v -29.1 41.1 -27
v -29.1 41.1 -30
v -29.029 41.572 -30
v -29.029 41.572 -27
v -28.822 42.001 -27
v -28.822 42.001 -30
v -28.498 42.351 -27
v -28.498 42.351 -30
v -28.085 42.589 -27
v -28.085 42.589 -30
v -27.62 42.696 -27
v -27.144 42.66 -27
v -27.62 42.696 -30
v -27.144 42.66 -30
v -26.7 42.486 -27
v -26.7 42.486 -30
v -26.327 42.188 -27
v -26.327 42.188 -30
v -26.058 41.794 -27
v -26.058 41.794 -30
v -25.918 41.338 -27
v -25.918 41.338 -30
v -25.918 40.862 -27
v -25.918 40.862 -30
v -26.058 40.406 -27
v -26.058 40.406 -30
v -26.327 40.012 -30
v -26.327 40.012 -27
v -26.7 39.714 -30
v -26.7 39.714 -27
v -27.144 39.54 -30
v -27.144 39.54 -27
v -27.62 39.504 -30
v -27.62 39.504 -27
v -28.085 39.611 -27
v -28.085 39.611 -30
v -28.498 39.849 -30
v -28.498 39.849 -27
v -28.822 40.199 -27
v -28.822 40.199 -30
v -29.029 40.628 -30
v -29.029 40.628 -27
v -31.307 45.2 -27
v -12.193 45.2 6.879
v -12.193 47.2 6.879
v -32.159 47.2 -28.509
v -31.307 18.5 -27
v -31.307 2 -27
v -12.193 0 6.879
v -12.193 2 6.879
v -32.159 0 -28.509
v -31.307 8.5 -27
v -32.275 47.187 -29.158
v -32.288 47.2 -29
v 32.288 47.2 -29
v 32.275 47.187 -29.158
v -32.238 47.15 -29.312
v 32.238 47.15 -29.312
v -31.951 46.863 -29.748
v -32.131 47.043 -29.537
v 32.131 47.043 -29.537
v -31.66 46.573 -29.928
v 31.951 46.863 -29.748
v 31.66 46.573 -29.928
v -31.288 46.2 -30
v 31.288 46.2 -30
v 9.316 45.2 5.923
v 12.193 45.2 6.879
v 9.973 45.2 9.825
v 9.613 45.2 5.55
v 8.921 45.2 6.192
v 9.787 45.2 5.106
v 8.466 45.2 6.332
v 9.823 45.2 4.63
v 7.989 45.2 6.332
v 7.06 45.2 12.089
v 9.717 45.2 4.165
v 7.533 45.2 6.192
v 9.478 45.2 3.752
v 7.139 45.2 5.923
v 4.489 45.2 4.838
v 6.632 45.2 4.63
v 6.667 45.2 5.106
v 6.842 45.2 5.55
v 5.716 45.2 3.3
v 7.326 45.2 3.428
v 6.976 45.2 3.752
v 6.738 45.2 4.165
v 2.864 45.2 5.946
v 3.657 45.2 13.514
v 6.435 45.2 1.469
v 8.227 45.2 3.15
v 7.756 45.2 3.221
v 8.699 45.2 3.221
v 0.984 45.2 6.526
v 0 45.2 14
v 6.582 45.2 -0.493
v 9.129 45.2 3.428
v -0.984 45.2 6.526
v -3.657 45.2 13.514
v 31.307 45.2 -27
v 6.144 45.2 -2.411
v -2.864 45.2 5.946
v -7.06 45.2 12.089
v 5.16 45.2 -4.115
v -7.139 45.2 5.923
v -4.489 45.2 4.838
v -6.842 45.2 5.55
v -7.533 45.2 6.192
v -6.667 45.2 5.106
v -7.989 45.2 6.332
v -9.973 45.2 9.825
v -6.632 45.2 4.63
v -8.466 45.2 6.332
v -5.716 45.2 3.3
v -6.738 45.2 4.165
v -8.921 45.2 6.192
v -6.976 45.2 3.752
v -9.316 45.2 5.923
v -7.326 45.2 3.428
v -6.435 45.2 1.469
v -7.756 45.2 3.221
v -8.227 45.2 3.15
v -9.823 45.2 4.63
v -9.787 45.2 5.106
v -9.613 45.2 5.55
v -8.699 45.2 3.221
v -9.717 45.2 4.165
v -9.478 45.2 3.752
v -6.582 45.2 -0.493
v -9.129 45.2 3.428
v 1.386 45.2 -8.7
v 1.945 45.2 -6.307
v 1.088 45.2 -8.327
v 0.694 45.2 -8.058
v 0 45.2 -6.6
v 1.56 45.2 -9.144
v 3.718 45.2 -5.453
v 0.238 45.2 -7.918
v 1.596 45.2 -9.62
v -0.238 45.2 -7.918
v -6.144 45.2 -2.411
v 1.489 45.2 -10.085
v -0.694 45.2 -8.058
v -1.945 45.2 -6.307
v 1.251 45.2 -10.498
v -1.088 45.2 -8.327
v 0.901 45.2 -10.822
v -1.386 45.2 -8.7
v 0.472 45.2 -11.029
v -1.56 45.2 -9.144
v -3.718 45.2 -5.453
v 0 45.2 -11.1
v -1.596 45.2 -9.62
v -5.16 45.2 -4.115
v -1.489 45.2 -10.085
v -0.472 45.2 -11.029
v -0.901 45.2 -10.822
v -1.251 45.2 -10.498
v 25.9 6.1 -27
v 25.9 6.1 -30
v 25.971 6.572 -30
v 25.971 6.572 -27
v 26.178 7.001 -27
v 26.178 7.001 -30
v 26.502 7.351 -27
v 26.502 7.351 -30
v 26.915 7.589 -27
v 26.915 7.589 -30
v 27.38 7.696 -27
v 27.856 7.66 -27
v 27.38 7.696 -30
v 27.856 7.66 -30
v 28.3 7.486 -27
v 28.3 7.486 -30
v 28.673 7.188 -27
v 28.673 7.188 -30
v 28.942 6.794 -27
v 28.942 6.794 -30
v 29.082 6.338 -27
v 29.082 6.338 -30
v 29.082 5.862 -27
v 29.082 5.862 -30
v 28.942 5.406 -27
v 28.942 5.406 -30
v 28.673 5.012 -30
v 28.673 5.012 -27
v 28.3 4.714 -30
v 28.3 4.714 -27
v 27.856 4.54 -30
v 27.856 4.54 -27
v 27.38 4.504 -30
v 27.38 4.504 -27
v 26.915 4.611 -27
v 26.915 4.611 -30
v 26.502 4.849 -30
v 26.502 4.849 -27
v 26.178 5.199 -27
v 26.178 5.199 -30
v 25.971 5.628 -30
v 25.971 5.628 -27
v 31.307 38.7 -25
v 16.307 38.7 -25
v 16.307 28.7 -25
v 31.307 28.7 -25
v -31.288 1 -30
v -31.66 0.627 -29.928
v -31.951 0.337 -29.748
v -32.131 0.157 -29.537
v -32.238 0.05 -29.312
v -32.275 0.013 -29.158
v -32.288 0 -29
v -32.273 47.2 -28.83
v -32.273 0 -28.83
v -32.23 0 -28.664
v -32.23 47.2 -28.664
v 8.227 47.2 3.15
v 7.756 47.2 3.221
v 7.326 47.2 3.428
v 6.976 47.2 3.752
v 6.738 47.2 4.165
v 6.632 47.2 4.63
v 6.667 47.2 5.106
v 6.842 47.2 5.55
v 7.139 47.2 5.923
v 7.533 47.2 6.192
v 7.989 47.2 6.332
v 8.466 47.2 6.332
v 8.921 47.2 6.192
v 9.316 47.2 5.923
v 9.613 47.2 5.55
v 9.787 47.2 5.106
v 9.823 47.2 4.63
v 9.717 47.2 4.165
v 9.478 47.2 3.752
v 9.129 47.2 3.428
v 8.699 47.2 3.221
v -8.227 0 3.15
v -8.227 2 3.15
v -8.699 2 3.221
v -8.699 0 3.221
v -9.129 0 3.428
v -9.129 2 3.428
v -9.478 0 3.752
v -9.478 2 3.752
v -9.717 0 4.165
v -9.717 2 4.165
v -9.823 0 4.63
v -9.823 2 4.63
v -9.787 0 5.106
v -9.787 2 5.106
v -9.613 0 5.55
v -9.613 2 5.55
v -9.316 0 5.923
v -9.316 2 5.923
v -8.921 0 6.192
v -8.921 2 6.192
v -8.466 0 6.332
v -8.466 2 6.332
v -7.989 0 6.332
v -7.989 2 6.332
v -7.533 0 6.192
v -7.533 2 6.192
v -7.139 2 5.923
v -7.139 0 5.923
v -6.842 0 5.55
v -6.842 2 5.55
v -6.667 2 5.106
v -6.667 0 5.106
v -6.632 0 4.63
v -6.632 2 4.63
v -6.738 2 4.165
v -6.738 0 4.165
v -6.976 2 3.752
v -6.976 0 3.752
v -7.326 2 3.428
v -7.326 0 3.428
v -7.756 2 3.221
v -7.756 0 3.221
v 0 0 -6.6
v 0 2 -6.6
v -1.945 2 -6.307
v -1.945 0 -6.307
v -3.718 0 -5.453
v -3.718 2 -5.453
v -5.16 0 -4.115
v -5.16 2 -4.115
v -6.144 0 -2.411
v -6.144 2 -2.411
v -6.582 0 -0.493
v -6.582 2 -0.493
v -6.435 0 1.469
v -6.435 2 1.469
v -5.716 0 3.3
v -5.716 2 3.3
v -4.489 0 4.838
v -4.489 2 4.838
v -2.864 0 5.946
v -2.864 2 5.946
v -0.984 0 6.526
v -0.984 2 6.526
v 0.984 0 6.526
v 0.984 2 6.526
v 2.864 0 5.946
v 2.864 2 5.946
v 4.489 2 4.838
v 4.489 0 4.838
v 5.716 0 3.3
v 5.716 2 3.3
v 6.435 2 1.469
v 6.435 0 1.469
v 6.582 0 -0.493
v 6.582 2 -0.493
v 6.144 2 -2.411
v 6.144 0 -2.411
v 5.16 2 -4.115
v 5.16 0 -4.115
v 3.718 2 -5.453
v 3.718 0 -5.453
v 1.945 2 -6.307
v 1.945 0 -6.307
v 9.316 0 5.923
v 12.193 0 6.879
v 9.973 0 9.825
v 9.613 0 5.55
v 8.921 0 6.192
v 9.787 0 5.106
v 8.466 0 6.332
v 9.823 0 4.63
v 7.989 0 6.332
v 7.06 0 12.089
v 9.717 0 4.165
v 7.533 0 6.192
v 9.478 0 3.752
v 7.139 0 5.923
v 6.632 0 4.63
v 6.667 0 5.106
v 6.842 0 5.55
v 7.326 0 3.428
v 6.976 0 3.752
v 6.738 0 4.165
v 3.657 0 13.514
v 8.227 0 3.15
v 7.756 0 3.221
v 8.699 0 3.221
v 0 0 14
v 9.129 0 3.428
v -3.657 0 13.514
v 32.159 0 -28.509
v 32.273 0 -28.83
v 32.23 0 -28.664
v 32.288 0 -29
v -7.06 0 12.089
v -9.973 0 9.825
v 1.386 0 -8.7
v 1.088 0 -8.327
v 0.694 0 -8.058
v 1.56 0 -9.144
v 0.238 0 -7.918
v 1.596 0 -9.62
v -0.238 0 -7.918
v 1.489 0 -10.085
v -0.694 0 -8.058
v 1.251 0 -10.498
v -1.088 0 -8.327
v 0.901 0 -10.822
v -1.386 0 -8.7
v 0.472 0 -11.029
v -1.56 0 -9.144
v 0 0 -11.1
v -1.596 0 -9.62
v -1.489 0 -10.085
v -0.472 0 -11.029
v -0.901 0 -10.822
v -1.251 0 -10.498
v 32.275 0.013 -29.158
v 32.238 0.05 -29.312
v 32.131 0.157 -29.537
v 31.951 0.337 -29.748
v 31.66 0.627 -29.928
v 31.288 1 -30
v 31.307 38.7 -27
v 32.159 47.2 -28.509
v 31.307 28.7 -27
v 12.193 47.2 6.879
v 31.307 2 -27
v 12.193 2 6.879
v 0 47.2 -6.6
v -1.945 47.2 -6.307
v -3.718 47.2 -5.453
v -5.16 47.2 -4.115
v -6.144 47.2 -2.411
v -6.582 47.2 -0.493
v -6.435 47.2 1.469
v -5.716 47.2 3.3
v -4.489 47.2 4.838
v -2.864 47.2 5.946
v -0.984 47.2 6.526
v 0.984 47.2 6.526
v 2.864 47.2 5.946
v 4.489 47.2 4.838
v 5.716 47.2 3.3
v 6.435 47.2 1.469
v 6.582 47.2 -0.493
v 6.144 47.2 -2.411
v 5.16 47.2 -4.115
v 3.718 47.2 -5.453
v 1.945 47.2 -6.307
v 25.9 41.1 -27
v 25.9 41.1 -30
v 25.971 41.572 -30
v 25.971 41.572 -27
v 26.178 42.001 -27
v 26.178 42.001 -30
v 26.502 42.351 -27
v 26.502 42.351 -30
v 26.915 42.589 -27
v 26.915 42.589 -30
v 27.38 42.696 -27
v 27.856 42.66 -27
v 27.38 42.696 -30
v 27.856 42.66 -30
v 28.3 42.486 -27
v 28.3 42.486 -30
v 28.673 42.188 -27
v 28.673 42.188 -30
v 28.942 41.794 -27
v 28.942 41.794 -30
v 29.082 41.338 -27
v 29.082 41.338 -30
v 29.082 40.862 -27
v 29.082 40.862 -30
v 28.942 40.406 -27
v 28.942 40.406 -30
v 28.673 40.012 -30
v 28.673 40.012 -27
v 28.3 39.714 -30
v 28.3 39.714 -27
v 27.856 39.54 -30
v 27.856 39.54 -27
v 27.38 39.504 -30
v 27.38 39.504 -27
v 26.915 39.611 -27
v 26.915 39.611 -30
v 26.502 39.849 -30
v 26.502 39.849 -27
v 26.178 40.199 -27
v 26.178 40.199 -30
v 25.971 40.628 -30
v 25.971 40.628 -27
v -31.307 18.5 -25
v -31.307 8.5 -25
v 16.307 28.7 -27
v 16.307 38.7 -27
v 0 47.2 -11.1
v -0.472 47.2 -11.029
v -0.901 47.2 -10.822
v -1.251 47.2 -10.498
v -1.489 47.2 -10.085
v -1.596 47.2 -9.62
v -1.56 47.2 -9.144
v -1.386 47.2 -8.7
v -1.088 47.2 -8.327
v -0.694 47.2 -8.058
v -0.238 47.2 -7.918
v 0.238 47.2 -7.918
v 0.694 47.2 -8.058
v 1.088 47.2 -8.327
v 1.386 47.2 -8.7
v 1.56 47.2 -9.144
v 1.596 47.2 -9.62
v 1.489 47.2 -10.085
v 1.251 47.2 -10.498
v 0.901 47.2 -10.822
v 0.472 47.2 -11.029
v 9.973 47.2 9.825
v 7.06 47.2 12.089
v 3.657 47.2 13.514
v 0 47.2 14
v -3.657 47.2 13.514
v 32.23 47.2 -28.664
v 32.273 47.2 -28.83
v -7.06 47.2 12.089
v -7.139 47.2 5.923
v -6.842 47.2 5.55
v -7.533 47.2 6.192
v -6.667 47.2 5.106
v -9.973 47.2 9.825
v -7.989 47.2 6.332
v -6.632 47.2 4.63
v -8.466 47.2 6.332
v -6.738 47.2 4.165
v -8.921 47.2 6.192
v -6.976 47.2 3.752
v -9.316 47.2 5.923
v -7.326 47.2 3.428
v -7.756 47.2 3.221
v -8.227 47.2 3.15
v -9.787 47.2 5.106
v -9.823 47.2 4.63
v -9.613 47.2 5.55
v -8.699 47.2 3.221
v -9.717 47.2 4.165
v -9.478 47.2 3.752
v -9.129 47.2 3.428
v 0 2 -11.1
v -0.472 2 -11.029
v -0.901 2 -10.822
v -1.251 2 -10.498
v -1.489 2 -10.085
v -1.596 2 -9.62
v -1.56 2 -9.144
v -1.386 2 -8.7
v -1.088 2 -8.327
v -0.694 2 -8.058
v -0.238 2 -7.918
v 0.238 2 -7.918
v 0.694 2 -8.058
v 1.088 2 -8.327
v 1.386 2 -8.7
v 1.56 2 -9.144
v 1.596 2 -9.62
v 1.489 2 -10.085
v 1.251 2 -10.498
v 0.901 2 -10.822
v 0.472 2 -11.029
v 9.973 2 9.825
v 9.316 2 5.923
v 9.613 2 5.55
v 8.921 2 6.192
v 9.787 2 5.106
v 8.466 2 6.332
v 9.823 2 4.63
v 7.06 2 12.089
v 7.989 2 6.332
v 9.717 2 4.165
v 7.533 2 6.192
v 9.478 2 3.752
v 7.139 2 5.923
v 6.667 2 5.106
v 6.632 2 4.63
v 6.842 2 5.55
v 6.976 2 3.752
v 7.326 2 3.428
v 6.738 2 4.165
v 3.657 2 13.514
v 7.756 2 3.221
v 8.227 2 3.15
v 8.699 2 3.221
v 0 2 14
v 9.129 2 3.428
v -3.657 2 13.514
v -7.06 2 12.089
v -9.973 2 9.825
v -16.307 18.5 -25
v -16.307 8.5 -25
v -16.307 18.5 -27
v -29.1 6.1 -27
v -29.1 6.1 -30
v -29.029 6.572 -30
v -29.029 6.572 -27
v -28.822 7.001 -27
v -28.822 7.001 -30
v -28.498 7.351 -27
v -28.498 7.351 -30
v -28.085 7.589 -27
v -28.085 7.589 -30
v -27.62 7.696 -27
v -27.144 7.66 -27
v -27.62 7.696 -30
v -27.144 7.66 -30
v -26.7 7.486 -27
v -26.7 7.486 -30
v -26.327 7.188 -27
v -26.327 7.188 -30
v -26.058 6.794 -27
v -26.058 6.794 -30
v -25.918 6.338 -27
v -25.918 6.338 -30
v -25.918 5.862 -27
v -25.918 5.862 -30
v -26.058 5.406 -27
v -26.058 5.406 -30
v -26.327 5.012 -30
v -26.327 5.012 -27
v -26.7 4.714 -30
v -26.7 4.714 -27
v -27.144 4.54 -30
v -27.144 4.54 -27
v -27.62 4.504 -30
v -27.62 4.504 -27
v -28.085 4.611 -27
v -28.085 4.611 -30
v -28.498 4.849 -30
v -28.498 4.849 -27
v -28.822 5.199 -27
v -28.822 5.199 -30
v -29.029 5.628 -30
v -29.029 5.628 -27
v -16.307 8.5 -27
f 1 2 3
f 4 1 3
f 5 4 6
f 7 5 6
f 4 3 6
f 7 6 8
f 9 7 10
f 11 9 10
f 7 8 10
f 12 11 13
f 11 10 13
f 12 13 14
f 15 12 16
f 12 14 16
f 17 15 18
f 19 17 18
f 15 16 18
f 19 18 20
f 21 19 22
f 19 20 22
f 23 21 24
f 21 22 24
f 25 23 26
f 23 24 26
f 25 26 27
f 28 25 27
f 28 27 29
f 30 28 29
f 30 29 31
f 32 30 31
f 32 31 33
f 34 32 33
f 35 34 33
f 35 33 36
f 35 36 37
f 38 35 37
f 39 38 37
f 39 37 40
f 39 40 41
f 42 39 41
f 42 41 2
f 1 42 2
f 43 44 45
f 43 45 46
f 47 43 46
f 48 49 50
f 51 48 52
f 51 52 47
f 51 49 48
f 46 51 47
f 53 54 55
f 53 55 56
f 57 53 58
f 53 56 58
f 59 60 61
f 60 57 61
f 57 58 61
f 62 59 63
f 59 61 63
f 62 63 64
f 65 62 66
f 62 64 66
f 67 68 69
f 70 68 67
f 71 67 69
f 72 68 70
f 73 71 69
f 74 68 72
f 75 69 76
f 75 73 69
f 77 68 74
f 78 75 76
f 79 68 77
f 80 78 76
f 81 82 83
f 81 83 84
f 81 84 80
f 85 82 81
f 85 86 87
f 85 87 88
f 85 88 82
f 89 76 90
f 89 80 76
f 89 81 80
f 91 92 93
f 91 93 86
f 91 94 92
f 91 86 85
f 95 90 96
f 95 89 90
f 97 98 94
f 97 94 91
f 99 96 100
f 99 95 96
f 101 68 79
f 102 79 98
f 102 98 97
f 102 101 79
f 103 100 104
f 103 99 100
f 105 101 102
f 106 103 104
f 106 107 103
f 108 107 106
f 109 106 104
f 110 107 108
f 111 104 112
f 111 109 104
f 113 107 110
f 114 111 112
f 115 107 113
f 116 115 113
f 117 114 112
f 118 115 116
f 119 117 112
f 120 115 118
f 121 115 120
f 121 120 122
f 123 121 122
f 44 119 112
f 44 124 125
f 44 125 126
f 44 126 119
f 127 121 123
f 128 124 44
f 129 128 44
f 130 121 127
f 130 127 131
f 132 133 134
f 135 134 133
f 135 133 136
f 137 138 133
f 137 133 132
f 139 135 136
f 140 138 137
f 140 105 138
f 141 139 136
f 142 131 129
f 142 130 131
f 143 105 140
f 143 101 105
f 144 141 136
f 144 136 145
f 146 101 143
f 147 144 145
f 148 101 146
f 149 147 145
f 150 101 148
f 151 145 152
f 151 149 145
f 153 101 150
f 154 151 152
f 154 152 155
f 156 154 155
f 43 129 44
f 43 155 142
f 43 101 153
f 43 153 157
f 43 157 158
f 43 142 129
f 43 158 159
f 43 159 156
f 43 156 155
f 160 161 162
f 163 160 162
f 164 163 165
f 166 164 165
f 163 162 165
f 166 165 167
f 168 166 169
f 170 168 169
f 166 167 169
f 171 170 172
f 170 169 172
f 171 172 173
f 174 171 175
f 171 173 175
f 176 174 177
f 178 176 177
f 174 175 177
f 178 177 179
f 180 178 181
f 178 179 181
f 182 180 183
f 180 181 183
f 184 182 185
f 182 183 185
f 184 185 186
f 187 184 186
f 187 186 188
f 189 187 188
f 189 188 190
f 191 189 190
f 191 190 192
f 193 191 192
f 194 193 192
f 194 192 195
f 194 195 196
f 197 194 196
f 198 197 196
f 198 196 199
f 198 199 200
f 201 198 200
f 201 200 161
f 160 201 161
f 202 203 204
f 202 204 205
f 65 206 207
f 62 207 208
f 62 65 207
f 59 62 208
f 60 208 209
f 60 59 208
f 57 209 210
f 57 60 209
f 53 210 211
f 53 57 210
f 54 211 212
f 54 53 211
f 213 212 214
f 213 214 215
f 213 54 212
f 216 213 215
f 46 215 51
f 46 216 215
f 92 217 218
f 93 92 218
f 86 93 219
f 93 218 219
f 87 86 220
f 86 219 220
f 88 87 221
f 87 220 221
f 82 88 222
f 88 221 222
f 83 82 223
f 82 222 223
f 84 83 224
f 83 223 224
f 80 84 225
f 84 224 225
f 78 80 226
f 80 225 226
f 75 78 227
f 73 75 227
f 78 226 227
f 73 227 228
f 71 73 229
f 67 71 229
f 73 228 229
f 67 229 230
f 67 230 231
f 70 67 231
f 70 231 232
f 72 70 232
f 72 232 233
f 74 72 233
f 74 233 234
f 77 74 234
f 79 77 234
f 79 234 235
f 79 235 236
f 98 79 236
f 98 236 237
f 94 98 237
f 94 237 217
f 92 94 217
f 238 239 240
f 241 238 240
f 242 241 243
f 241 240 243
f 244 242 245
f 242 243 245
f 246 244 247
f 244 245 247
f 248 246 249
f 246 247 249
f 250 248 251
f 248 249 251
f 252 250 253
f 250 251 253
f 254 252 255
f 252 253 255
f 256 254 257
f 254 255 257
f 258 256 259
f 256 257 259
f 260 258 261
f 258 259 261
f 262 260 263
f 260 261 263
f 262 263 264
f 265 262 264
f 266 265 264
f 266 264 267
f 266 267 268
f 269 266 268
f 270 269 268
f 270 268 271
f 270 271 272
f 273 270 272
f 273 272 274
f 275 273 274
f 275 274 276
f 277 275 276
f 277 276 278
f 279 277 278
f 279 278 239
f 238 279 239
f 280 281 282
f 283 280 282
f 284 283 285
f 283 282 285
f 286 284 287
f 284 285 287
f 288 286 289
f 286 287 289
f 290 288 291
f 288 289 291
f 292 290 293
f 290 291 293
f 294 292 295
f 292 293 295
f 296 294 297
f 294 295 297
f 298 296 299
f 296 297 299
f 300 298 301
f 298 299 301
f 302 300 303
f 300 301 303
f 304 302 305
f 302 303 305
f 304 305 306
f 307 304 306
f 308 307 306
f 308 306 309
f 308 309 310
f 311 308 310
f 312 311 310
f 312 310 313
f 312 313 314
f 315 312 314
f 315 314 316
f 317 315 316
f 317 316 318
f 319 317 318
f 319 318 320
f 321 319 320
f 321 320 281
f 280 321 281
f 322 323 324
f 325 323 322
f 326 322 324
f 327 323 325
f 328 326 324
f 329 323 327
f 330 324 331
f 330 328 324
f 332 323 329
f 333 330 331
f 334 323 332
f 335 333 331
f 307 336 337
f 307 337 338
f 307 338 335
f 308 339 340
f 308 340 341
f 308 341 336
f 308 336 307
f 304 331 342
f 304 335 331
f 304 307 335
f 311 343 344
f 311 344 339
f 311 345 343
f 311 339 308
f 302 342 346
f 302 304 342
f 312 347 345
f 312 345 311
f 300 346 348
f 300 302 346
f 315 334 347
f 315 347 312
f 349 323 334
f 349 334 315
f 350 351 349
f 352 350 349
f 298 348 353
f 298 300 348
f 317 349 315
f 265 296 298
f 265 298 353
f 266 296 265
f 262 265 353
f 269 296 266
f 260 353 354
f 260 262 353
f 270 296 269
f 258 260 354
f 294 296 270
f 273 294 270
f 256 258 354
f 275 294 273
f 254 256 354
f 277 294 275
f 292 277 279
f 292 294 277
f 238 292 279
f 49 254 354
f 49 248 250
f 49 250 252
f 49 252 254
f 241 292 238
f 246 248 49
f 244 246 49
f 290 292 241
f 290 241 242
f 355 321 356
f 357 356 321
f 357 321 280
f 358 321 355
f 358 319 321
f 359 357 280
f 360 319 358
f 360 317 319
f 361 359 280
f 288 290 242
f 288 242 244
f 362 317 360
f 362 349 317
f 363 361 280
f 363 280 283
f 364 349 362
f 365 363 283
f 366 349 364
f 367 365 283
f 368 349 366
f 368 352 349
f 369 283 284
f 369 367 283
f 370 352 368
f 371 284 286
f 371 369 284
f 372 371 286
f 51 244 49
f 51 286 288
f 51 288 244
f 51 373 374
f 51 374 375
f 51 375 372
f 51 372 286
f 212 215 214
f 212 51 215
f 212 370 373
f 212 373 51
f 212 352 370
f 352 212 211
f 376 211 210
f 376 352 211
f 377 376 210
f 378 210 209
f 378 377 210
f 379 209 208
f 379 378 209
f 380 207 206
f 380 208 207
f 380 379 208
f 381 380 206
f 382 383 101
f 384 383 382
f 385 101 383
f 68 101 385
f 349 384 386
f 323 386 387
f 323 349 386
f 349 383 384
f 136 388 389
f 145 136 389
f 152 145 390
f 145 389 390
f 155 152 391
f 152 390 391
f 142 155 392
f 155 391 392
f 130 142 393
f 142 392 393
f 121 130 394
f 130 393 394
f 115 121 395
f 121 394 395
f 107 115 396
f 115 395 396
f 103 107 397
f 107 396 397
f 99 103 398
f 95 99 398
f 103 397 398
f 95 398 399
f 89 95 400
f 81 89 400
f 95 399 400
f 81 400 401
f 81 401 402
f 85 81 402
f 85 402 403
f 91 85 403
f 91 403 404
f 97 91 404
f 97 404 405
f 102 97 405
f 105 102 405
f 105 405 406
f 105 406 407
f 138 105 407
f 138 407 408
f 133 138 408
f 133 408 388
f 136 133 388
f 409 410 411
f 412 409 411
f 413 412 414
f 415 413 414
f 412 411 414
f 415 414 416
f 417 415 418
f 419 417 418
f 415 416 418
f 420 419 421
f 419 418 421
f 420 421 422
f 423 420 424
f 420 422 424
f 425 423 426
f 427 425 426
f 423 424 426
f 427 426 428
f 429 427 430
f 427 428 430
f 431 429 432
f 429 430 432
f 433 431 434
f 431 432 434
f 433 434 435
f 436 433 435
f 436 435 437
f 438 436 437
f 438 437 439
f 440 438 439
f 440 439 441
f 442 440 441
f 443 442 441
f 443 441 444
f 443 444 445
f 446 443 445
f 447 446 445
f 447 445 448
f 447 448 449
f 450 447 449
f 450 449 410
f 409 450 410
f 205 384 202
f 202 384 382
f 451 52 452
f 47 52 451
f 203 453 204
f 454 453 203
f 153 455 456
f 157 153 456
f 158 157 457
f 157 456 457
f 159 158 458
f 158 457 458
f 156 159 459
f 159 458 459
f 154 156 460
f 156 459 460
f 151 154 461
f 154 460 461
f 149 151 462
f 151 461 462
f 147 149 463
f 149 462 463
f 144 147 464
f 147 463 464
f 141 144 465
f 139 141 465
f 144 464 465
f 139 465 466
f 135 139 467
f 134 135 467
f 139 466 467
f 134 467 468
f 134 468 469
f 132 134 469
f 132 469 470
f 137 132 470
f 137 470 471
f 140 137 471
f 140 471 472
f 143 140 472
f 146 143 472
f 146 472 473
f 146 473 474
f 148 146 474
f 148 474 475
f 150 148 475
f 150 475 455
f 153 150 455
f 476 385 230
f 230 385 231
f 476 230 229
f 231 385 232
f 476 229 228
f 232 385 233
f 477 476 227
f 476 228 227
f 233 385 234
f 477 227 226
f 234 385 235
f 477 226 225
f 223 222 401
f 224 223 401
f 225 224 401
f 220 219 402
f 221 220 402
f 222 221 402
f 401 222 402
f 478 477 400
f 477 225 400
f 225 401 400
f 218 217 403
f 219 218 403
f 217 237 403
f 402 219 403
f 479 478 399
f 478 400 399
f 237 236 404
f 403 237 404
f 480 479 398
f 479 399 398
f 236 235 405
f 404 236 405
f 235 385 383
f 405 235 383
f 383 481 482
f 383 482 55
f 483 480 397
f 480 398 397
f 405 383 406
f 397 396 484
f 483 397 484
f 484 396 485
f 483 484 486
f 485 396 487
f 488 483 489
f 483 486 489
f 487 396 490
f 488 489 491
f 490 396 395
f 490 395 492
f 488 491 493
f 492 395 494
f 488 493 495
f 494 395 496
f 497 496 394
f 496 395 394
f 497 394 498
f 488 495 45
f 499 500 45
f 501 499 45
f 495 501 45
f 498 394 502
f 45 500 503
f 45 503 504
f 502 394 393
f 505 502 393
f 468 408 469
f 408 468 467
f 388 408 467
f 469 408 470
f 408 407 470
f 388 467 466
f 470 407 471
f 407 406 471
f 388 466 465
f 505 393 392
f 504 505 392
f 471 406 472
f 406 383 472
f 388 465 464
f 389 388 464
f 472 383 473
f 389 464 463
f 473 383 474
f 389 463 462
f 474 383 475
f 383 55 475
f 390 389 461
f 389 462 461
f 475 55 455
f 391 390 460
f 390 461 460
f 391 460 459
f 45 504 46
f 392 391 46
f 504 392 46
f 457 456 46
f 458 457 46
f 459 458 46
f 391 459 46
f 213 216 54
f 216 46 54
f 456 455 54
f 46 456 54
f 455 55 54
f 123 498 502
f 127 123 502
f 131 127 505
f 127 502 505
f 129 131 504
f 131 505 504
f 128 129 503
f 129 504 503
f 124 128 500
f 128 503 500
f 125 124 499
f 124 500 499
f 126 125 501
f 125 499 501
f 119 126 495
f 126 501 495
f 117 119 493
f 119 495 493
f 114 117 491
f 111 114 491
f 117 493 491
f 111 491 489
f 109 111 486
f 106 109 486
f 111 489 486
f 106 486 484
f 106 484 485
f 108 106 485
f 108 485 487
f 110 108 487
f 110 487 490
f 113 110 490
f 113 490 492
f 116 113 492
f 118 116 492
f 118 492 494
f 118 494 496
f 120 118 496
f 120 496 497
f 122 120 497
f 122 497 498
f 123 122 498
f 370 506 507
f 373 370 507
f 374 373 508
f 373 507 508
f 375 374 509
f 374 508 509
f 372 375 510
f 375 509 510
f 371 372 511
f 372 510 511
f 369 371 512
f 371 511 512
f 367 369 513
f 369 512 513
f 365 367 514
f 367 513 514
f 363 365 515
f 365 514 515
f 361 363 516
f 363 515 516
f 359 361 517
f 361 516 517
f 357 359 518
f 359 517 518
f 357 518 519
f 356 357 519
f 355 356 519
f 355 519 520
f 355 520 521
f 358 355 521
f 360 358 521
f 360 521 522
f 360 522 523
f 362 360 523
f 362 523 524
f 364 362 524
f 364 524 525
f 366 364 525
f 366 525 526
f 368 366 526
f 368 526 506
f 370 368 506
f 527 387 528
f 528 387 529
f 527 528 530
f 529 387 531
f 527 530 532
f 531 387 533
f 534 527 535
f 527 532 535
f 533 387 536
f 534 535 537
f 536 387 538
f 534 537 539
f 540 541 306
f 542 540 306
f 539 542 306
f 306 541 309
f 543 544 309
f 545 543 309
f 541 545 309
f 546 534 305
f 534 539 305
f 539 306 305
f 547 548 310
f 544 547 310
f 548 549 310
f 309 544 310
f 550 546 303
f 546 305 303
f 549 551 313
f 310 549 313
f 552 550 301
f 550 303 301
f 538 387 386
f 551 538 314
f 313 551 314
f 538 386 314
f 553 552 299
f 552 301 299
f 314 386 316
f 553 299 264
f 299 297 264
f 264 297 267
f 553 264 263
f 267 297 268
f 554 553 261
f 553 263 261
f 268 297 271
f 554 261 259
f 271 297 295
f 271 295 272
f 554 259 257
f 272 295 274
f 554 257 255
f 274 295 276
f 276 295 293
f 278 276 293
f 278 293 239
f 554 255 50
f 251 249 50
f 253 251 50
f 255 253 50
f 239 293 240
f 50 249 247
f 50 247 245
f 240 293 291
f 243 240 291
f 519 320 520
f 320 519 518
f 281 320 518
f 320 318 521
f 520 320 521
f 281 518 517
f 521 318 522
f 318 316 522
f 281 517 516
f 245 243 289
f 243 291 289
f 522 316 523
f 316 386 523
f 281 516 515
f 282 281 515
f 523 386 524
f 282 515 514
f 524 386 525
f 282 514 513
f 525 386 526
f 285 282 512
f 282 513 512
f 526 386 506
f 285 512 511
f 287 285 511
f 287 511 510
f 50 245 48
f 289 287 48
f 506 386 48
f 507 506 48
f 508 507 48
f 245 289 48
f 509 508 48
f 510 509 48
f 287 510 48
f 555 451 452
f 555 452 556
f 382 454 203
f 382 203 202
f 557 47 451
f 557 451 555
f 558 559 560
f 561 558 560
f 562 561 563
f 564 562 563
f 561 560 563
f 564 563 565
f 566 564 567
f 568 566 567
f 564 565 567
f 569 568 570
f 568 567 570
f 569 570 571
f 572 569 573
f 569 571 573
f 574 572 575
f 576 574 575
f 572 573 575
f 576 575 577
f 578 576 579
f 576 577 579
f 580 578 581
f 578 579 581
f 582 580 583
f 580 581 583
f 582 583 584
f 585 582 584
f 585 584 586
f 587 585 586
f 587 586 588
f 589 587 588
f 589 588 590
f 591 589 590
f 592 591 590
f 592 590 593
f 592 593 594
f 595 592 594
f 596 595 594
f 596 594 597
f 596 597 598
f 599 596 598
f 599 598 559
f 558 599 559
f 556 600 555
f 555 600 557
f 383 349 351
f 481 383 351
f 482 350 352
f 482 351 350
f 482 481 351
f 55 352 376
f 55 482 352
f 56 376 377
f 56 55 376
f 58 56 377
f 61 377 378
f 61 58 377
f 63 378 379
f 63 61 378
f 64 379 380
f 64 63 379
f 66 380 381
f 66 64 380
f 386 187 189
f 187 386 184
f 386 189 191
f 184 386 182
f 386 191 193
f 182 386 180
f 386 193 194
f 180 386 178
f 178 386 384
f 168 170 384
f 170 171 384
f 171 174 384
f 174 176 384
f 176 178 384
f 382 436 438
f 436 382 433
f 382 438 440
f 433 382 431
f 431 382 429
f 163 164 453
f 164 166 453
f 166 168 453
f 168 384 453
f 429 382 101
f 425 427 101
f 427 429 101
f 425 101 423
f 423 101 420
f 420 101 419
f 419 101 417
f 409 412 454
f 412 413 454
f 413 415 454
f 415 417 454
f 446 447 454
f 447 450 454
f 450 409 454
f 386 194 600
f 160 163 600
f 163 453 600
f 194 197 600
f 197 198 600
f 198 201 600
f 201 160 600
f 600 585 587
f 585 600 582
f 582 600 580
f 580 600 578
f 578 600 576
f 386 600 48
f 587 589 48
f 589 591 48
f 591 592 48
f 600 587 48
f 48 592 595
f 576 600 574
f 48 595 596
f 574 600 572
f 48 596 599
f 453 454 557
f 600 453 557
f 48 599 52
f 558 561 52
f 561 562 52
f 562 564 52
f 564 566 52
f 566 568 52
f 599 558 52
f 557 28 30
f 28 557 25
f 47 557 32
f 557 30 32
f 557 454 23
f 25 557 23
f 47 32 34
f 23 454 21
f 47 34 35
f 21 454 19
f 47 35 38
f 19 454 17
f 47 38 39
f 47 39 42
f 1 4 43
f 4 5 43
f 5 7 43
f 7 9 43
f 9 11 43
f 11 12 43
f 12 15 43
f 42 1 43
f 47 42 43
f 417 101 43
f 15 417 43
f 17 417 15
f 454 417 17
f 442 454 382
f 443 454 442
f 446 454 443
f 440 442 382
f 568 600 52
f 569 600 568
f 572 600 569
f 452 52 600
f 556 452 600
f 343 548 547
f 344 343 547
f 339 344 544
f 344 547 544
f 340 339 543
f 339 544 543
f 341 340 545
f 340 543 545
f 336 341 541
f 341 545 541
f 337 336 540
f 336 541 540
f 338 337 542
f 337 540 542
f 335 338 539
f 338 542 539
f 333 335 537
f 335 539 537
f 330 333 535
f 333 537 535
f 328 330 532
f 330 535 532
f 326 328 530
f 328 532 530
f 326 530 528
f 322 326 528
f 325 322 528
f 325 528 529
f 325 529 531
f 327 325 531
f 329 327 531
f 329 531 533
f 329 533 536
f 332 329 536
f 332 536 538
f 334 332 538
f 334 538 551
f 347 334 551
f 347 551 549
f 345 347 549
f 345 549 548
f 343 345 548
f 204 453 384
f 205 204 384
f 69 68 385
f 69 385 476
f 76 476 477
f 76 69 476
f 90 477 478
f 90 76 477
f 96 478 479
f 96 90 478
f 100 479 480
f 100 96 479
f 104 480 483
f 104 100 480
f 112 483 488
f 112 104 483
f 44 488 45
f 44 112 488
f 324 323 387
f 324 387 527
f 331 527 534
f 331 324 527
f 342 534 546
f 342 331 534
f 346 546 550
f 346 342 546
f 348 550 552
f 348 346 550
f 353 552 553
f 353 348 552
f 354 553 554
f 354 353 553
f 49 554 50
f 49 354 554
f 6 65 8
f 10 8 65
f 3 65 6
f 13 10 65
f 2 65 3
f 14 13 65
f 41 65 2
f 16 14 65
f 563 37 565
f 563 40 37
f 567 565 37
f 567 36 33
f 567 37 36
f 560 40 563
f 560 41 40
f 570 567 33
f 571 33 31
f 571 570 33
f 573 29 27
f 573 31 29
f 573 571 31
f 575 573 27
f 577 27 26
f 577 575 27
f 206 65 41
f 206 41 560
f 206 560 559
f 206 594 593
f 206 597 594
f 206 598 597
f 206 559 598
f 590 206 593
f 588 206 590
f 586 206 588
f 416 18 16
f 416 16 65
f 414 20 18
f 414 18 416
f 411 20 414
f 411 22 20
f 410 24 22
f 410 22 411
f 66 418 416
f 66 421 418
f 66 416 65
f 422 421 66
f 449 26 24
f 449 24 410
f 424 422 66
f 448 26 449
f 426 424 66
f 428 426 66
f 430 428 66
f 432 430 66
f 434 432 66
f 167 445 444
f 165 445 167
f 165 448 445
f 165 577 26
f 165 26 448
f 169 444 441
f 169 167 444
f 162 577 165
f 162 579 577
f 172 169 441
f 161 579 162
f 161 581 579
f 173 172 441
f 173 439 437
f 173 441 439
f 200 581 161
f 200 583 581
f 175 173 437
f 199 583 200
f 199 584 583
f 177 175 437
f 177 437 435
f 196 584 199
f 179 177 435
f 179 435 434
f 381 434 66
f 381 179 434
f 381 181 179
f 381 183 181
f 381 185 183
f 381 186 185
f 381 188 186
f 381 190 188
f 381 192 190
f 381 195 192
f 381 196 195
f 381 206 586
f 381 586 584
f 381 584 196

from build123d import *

# Parameters (mm, degrees)
EXTRUDE_1_DEPTH     = 47.2
CUT_EXTRUDE_2_REACH = 77.476
CUT_EXTRUDE_START   = -3
SKETCH_2_W          = 66
SKETCH_2_H          = 43.2
CUT_EXTRUDE_3_REACH = 66.937
SKETCH_3_R          = 1.6
SKETCH_3_R_2        = 6.6
CUT_EXTRUDE_4_REACH = 74.476
SKETCH_4_R          = 1.6
FILLET_1_R          = 1
SKETCH_5_W          = 15
SKETCH_5_H          = 10
EXTRUDE_2_DEPTH     = 2


with BuildPart() as part:
    # 草图1 → 凸台-拉伸1 (new body)
    with BuildSketch(Plane(origin=(0, 0, 0), x_dir=(1, 0, 0), z_dir=(0, 1, 0))):
        with BuildLine():
            Line((33, 30), (12.193267422, -6.879260831))
            ThreePointArc((12.193267422, -6.879260831), (0, -14), (-12.193267422, -6.879260831))
            Line((-12.193267422, -6.879260831), (-33, 30))
            Line((-33, 30), (33, 30))
        make_face()
    extrude(amount=EXTRUDE_1_DEPTH)

    # 草图2 → 切除-拉伸2 (cut, up to next)
    with BuildSketch(Plane(origin=(0, 0, -30), x_dir=(-1, 0, 0), z_dir=(0, 0, -1)).offset(CUT_EXTRUDE_START), mode=Mode.PRIVATE) as cut_extrude_2_sk1:
        with Locations((0, 23.6)):
            Rectangle(SKETCH_2_W, SKETCH_2_H)
    cut_extrude_2_tool1 = extrude(cut_extrude_2_sk1.sketch, amount=-CUT_EXTRUDE_2_REACH, mode=Mode.PRIVATE) & part.part
    add(cut_extrude_2_tool1.solids().sort_by_distance((0, 23.6, -27))[0], mode=Mode.SUBTRACT)

    # 切除-拉伸3: up to this face of the body (flat: up to its plane)
    cut_extrude_3_end = Plane(part.part.faces().sort_by_distance((0, 0, -12.723672626))[0])
    # 草图3 → 切除-拉伸3 (cut, up to the picked face)
    with BuildSketch(Plane(origin=(0, 47.2, 0), x_dir=(1, 0, 0), z_dir=(0, 1, 0)), mode=Mode.PRIVATE) as cut_extrude_3_sk1:
        with Locations(Location((-8.227241336, -4.75, 0), (0, 0, 90))):
            Circle(SKETCH_3_R)
    cut_extrude_3_tool1 = split(extrude(cut_extrude_3_sk1.sketch, amount=-CUT_EXTRUDE_3_REACH, mode=Mode.PRIVATE), bisect_by=cut_extrude_3_end, keep=Keep.BOTH, mode=Mode.PRIVATE)
    # 草图3 → 切除-拉伸3 (cut, up to the picked face)
    with BuildSketch(Plane(origin=(0, 47.2, 0), x_dir=(1, 0, 0), z_dir=(0, 1, 0)), mode=Mode.PRIVATE) as cut_extrude_3_sk2:
        with Locations(Location((8.227241336, -4.75, 0), (0, 0, 90))):
            Circle(SKETCH_3_R)
    cut_extrude_3_tool2 = split(extrude(cut_extrude_3_sk2.sketch, amount=-CUT_EXTRUDE_3_REACH, mode=Mode.PRIVATE), bisect_by=cut_extrude_3_end, keep=Keep.BOTH, mode=Mode.PRIVATE)
    # 草图3 → 切除-拉伸3 (cut, up to the picked face)
    with BuildSketch(Plane(origin=(0, 47.2, 0), x_dir=(1, 0, 0), z_dir=(0, 1, 0)), mode=Mode.PRIVATE) as cut_extrude_3_sk3:
        with Locations(Location((0, 0, 0), (0, 0, 90))):
            Circle(SKETCH_3_R_2)
    cut_extrude_3_tool3 = split(extrude(cut_extrude_3_sk3.sketch, amount=-CUT_EXTRUDE_3_REACH, mode=Mode.PRIVATE), bisect_by=cut_extrude_3_end, keep=Keep.BOTH, mode=Mode.PRIVATE)
    # 草图3 → 切除-拉伸3 (cut, up to the picked face)
    with BuildSketch(Plane(origin=(0, 47.2, 0), x_dir=(1, 0, 0), z_dir=(0, 1, 0)), mode=Mode.PRIVATE) as cut_extrude_3_sk4:
        with Locations(Location((0, 9.5, 0), (0, 0, 90))):
            Circle(SKETCH_3_R)
    cut_extrude_3_tool4 = split(extrude(cut_extrude_3_sk4.sketch, amount=-CUT_EXTRUDE_3_REACH, mode=Mode.PRIVATE), bisect_by=cut_extrude_3_end, keep=Keep.BOTH, mode=Mode.PRIVATE)
    add(cut_extrude_3_tool1.solids().sort_by(Axis((-8.227241, 47.2, 4.75), (0, -1, 0)))[0], mode=Mode.SUBTRACT)
    add(cut_extrude_3_tool2.solids().sort_by(Axis((8.227241, 47.2, 4.75), (0, -1, 0)))[0], mode=Mode.SUBTRACT)
    add(cut_extrude_3_tool3.solids().sort_by(Axis((0, 47.2, 0), (0, -1, 0)))[0], mode=Mode.SUBTRACT)
    add(cut_extrude_3_tool4.solids().sort_by(Axis((0, 47.2, -9.5), (0, -1, 0)))[0], mode=Mode.SUBTRACT)

    # 草图4 → 切除-拉伸4 (cut, up to next)
    with BuildSketch(Plane(origin=(0, 0, -30), x_dir=(-1, 0, 0), z_dir=(0, 0, -1)), mode=Mode.PRIVATE) as cut_extrude_4_sk1:
        with Locations((-27.5, 41.1)):
            Circle(SKETCH_4_R)
    cut_extrude_4_tool1 = extrude(cut_extrude_4_sk1.sketch, amount=-CUT_EXTRUDE_4_REACH, mode=Mode.PRIVATE) & part.part
    # 草图4 → 切除-拉伸4 (cut, up to next)
    with BuildSketch(Plane(origin=(0, 0, -30), x_dir=(-1, 0, 0), z_dir=(0, 0, -1)), mode=Mode.PRIVATE) as cut_extrude_4_sk2:
        with Locations((27.5, 41.1)):
            Circle(SKETCH_4_R)
    cut_extrude_4_tool2 = extrude(cut_extrude_4_sk2.sketch, amount=-CUT_EXTRUDE_4_REACH, mode=Mode.PRIVATE) & part.part
    # 草图4 → 切除-拉伸4 (cut, up to next)
    with BuildSketch(Plane(origin=(0, 0, -30), x_dir=(-1, 0, 0), z_dir=(0, 0, -1)), mode=Mode.PRIVATE) as cut_extrude_4_sk3:
        with Locations((27.5, 6.1)):
            Circle(SKETCH_4_R)
    cut_extrude_4_tool3 = extrude(cut_extrude_4_sk3.sketch, amount=-CUT_EXTRUDE_4_REACH, mode=Mode.PRIVATE) & part.part
    # 草图4 → 切除-拉伸4 (cut, up to next)
    with BuildSketch(Plane(origin=(0, 0, -30), x_dir=(-1, 0, 0), z_dir=(0, 0, -1)), mode=Mode.PRIVATE) as cut_extrude_4_sk4:
        with Locations((-27.5, 6.1)):
            Circle(SKETCH_4_R)
    cut_extrude_4_tool4 = extrude(cut_extrude_4_sk4.sketch, amount=-CUT_EXTRUDE_4_REACH, mode=Mode.PRIVATE) & part.part
    add(cut_extrude_4_tool1.solids().sort_by_distance((27.5, 41.1, -30))[0], mode=Mode.SUBTRACT)
    add(cut_extrude_4_tool2.solids().sort_by_distance((-27.5, 41.1, -30))[0], mode=Mode.SUBTRACT)
    add(cut_extrude_4_tool3.solids().sort_by_distance((-27.5, 6.1, -30))[0], mode=Mode.SUBTRACT)
    add(cut_extrude_4_tool4.solids().sort_by_distance((27.5, 6.1, -30))[0], mode=Mode.SUBTRACT)

    # 圆角1
    fillet_1_edges = [part.edges().sort_by_distance(p)[0] for p in [
        (0, 47.2, -30),
        (0, 0, -30),
        (-33, 23.6, -30),
        (33, 23.6, -30),
    ]]
    fillet(fillet_1_edges, radius=FILLET_1_R)

    # 草图5 → 凸台-拉伸2 (add)
    with BuildSketch(Plane.XY.offset(-27)):
        with Locations((23.807444446, 33.7)):
            Rectangle(SKETCH_5_W, SKETCH_5_H)
        with Locations((-23.807444446, 13.5)):
            Rectangle(SKETCH_5_W, SKETCH_5_H)
    extrude(amount=EXTRUDE_2_DEPTH)


solid = part.part
